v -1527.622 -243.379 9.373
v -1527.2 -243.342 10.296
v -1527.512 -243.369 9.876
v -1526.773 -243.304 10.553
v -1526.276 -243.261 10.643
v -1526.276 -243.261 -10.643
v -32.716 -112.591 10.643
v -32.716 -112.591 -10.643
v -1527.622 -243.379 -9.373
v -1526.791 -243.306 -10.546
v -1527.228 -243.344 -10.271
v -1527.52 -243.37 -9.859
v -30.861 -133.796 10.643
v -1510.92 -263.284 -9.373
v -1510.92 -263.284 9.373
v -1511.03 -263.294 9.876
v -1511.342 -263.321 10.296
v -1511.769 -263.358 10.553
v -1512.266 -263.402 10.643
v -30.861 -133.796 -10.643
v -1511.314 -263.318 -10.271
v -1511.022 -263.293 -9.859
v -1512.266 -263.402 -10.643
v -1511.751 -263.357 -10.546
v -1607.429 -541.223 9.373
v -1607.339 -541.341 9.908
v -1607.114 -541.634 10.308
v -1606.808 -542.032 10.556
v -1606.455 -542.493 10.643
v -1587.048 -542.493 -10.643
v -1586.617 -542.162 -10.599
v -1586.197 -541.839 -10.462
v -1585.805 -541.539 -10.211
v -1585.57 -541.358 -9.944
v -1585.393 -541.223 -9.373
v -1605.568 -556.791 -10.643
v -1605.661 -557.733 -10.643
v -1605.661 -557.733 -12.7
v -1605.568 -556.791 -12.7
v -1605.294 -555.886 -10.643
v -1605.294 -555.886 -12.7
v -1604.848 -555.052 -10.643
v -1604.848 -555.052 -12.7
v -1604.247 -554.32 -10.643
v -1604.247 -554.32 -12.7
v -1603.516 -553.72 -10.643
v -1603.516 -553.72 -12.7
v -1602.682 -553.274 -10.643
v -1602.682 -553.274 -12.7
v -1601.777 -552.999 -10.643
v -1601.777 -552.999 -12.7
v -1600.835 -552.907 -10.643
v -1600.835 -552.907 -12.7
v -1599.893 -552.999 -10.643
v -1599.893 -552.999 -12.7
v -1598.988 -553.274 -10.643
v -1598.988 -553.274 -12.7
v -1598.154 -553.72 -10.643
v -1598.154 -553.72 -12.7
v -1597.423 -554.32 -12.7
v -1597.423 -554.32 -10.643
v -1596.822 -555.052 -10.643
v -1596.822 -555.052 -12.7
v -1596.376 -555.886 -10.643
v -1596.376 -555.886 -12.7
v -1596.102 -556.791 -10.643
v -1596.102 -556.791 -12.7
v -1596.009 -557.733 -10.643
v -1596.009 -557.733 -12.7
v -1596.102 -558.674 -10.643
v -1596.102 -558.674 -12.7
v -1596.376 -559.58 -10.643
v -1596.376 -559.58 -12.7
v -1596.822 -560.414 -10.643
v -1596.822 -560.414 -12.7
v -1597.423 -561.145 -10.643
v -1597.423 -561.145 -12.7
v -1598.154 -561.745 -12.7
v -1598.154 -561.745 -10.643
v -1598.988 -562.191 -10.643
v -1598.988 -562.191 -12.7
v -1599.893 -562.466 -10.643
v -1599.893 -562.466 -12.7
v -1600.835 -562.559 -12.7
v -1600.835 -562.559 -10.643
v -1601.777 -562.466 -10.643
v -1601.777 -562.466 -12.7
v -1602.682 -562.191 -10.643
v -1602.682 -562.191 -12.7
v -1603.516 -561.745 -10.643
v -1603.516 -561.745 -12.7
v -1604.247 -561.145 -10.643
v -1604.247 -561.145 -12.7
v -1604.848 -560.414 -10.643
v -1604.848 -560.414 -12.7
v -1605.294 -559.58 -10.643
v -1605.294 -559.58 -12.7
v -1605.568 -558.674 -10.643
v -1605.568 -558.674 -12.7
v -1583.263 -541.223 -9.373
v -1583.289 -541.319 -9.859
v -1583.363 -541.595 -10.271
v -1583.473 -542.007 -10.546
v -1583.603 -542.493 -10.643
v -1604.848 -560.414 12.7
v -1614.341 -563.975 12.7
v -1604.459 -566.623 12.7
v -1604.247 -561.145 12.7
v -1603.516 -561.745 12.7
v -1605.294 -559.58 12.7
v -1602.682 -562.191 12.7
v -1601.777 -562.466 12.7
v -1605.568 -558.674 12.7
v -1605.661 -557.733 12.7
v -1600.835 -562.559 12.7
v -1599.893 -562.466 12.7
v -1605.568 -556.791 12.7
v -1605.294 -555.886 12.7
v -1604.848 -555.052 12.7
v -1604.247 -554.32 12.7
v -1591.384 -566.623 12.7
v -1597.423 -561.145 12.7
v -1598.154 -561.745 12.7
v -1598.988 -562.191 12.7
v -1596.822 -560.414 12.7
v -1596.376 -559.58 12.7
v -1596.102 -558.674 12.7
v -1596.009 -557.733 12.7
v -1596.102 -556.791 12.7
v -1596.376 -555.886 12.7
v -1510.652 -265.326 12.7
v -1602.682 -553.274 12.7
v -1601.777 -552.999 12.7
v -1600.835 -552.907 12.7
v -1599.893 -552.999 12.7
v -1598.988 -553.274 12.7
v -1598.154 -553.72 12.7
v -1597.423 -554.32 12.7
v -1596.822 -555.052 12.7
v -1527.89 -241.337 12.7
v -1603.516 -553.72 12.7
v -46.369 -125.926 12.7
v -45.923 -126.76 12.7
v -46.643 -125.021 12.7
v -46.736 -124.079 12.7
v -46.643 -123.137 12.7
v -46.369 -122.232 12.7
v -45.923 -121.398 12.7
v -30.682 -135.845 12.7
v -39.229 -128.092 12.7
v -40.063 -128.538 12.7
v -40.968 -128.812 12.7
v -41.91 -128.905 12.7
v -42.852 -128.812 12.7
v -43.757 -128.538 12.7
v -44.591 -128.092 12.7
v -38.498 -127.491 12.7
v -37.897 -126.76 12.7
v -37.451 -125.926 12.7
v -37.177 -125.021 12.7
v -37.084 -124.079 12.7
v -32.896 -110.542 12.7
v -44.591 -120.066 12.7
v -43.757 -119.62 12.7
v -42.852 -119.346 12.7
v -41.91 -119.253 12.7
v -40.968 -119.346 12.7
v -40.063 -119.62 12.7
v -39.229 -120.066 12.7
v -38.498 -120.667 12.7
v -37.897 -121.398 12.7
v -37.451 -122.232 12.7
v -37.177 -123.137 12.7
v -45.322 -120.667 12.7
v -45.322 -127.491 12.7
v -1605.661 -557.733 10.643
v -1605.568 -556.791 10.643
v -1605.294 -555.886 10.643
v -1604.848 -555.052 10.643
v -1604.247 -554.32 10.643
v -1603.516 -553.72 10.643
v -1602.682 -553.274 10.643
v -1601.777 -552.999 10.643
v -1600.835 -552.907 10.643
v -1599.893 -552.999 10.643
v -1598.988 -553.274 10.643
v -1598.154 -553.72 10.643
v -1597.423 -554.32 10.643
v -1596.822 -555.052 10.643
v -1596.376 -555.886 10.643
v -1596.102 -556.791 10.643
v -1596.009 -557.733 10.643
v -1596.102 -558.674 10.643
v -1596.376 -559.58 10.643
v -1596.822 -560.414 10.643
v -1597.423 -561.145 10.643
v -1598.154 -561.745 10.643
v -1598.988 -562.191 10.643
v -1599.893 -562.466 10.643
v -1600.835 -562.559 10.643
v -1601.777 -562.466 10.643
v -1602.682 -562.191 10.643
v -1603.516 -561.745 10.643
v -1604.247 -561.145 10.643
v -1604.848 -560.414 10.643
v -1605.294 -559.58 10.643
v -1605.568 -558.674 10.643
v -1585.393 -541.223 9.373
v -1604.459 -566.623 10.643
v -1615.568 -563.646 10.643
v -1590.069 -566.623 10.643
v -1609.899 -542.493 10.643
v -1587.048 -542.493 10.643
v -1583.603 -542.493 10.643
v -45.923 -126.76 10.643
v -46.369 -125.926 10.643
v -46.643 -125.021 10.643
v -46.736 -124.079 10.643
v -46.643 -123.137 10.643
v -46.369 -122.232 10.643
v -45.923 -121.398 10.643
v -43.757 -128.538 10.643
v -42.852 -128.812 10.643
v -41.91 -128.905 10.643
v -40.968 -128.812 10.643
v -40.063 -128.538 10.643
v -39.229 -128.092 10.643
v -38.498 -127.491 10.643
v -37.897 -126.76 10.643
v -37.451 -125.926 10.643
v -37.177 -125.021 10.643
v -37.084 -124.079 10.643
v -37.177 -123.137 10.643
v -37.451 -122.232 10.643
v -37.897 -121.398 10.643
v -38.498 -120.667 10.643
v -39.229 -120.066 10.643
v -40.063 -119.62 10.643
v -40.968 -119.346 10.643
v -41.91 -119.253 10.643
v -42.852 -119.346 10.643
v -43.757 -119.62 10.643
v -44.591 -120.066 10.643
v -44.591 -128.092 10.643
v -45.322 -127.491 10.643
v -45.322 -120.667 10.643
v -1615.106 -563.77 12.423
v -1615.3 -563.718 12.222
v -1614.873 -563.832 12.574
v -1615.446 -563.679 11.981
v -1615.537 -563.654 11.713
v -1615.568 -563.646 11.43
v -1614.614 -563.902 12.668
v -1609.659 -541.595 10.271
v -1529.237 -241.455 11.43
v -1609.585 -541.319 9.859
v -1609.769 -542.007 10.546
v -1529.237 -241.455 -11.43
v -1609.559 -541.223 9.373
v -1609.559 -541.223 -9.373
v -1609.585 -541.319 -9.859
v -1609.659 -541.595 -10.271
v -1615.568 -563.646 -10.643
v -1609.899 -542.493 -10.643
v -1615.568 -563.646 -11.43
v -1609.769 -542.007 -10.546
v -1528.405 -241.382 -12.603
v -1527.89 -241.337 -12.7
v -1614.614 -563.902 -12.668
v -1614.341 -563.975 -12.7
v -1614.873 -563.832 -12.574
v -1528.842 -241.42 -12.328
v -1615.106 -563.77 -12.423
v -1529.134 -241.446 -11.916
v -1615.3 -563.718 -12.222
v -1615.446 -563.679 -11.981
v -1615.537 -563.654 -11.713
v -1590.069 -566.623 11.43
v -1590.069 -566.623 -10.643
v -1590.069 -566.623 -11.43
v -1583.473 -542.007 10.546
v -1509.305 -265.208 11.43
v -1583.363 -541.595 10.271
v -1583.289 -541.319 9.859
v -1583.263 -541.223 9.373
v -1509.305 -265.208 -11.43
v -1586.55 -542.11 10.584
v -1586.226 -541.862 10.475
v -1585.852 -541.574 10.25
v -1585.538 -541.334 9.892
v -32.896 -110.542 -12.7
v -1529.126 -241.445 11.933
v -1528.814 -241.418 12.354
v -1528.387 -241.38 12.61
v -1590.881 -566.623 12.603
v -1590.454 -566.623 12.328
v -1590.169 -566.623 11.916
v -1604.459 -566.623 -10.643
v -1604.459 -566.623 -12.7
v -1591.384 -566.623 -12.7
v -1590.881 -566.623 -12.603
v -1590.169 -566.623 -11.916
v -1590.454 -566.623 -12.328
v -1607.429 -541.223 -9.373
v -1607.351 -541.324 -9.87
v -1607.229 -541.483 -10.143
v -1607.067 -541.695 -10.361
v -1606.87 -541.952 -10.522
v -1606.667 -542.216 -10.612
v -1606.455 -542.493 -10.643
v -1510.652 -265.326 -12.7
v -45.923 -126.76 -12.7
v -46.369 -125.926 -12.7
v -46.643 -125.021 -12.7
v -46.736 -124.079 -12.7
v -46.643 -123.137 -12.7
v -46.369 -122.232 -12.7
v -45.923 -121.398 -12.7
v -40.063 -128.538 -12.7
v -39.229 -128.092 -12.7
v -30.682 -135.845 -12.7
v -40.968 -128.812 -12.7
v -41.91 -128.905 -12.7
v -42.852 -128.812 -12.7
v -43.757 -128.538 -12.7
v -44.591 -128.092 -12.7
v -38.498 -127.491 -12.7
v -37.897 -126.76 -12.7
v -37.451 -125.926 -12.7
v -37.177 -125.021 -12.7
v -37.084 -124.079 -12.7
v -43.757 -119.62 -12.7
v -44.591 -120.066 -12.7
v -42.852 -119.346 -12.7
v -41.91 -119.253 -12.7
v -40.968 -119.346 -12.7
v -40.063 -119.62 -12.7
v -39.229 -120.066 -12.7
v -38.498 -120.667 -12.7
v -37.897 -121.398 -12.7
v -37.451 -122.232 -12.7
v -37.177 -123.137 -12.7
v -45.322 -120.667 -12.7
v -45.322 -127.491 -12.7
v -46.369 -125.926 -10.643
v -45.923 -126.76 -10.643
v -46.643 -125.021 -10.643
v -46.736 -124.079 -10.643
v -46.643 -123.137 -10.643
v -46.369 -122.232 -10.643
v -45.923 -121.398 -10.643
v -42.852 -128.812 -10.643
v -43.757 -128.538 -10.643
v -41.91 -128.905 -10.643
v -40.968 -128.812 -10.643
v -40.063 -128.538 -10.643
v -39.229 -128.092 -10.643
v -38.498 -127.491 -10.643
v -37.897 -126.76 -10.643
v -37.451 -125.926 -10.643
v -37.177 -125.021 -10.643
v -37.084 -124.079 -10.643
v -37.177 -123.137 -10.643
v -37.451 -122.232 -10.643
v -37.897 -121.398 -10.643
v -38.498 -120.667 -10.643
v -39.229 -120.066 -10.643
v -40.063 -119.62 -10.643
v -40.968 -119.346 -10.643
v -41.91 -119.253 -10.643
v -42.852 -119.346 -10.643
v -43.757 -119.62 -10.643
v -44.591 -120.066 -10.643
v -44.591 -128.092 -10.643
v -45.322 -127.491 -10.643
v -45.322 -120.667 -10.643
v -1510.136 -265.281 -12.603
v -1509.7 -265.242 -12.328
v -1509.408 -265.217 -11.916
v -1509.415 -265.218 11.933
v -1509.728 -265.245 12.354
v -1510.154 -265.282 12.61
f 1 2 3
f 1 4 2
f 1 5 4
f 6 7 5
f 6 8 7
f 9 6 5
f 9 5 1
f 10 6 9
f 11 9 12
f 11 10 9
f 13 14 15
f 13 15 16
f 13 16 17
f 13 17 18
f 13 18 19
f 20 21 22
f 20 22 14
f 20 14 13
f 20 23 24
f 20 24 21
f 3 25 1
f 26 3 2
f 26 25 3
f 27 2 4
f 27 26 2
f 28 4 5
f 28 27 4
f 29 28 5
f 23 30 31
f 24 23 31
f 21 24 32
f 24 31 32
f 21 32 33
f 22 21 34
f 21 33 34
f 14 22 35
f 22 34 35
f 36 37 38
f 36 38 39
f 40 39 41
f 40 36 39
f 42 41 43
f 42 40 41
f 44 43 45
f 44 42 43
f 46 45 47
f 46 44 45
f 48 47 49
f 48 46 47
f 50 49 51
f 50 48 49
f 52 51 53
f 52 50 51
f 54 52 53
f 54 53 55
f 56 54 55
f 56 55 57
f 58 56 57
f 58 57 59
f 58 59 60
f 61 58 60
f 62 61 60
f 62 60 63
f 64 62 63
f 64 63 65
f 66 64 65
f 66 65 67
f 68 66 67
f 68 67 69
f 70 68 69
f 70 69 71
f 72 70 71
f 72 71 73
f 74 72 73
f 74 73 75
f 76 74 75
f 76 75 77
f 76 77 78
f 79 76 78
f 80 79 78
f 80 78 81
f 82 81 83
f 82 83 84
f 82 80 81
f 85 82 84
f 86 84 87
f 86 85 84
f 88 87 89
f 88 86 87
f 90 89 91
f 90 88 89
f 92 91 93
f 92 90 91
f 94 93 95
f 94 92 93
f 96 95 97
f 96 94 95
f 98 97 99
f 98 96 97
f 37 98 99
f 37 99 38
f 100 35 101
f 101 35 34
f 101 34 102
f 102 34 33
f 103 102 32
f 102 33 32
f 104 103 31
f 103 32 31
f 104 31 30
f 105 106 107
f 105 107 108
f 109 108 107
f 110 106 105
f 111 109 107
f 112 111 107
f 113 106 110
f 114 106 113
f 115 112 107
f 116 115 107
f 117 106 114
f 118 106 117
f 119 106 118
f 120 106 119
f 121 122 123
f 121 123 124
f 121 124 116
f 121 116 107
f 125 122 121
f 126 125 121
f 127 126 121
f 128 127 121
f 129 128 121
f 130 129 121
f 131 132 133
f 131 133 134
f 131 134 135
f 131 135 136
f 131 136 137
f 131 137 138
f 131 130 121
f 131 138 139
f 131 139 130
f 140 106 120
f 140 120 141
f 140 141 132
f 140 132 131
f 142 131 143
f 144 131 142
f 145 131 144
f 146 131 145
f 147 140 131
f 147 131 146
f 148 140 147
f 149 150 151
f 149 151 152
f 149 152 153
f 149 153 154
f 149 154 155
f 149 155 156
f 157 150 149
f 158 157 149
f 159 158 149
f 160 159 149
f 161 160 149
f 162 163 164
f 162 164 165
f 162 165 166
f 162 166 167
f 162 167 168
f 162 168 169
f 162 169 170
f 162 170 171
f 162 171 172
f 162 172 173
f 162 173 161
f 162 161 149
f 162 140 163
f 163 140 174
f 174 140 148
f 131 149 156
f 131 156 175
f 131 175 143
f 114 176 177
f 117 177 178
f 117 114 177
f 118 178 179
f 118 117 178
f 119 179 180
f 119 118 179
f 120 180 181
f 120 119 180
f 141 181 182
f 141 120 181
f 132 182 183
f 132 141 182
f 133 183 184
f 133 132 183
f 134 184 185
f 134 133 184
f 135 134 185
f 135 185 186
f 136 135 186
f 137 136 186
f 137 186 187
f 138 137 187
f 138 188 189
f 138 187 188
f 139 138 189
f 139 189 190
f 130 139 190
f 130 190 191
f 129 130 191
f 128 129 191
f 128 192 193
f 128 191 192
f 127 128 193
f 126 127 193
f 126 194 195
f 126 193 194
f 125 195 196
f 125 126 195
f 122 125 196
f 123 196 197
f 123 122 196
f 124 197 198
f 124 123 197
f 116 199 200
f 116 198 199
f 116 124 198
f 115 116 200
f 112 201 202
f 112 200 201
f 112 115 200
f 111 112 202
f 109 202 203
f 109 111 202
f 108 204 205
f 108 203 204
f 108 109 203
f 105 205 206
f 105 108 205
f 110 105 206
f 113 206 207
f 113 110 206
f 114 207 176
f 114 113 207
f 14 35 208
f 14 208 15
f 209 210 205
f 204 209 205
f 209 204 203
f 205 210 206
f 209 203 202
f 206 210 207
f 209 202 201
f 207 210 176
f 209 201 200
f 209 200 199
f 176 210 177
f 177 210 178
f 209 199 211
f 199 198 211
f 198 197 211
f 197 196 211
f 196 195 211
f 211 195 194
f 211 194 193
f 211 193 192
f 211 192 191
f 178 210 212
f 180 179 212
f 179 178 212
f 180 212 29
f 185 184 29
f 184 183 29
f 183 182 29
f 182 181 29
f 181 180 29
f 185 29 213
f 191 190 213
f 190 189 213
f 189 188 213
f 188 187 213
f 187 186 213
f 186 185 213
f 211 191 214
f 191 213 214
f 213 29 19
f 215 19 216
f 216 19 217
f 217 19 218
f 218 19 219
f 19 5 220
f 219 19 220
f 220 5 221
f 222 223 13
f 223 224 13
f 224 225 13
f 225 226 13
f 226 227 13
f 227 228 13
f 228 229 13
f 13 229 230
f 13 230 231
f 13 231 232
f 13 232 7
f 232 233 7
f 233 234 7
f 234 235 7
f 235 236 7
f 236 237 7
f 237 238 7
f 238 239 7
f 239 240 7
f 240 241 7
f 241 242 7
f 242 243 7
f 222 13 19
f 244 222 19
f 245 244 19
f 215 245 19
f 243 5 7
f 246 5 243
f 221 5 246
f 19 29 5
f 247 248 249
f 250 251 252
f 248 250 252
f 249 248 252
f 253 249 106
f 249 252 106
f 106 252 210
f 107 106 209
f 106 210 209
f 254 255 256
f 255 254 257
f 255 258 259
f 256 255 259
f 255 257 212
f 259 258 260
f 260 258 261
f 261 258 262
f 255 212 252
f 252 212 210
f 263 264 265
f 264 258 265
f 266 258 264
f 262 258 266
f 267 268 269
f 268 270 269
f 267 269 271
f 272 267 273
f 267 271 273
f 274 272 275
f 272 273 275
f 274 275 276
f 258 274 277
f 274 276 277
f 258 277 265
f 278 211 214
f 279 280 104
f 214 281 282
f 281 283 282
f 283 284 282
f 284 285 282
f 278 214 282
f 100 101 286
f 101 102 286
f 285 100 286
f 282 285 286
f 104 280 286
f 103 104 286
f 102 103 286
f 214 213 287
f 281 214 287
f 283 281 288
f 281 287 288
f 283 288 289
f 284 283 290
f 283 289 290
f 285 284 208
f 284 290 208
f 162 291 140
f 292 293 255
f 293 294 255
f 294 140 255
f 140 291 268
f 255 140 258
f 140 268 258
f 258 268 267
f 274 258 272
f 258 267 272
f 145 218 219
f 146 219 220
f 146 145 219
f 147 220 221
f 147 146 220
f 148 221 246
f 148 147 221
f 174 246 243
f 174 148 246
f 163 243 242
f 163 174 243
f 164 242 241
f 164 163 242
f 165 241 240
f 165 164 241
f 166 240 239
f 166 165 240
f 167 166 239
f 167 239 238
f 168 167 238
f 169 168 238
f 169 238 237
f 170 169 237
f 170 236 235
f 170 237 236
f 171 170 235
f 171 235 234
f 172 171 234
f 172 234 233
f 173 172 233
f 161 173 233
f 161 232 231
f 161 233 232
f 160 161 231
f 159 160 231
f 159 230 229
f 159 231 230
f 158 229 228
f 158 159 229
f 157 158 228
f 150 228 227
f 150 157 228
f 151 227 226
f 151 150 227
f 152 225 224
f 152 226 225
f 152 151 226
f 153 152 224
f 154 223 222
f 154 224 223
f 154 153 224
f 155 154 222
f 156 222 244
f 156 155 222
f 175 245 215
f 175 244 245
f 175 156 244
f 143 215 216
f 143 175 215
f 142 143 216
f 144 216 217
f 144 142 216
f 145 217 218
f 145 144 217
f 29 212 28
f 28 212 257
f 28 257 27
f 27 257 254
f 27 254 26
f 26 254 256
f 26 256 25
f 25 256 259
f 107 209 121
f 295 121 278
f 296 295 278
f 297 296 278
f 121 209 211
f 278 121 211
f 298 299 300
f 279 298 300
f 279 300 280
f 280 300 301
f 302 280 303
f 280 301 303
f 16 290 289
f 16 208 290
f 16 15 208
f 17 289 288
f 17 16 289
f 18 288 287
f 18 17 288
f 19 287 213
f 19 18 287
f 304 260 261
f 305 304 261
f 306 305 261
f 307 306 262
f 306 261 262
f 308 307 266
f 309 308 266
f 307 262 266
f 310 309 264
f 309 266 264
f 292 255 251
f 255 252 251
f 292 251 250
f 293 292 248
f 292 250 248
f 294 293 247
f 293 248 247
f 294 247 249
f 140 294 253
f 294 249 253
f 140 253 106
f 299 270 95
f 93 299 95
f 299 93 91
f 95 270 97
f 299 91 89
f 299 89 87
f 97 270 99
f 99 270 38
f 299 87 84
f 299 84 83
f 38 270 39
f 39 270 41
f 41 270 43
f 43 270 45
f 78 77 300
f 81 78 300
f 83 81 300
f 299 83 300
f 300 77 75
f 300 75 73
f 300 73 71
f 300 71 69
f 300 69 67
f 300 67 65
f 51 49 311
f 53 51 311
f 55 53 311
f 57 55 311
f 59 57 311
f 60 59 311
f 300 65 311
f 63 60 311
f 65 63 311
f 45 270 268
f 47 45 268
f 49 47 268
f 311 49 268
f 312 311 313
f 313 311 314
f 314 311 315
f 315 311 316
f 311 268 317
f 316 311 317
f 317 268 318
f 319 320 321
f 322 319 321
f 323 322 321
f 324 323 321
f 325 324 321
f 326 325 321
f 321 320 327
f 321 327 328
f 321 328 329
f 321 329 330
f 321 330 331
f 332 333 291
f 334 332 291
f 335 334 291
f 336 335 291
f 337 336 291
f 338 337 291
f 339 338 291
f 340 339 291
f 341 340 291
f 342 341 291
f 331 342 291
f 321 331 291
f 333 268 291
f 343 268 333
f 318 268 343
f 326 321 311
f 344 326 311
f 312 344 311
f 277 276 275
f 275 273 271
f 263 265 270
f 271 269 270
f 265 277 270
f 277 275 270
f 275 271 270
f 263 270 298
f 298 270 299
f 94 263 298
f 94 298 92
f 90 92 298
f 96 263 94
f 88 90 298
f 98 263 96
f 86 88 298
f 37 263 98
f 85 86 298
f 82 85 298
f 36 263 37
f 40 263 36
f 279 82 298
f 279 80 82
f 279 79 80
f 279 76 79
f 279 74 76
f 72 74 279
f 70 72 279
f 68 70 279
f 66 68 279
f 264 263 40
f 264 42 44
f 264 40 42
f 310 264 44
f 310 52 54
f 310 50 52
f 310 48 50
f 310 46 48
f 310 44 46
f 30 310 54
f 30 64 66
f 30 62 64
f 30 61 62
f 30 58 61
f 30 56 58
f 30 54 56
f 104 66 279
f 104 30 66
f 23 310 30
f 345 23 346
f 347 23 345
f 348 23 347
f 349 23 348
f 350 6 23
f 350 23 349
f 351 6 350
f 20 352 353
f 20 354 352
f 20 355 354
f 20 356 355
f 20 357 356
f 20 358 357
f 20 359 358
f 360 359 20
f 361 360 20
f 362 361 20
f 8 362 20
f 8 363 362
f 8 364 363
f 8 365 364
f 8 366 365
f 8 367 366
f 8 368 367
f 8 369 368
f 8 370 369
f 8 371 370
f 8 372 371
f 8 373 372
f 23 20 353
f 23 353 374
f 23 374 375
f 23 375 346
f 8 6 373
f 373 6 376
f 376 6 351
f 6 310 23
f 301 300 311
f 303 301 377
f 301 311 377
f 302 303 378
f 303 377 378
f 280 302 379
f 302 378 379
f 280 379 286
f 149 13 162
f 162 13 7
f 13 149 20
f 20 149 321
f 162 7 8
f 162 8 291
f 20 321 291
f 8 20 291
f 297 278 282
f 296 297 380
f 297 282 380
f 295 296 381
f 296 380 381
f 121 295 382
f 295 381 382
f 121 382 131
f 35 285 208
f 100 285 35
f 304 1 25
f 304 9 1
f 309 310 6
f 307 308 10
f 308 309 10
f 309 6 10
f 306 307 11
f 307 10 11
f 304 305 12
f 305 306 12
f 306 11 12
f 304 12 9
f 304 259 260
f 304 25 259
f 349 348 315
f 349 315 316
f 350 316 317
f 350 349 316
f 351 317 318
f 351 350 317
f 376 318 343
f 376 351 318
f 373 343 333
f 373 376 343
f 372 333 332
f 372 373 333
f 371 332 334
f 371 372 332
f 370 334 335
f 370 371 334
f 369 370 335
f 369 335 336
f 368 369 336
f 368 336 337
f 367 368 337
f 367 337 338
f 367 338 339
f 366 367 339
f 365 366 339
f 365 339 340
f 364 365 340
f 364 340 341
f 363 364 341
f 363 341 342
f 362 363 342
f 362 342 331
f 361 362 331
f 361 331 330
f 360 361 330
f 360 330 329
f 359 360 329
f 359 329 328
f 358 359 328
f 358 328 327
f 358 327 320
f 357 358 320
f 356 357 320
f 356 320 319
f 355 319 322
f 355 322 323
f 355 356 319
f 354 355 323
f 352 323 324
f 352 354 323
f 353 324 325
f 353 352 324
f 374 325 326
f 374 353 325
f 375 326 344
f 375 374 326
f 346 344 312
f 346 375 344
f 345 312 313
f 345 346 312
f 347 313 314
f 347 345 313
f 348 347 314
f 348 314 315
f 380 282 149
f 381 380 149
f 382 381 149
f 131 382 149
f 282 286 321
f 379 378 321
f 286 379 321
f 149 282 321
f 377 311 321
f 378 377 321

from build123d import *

# Parameters (mm, degrees)
SKETCH1_R           = 4.82599999999999
SKETCH1_R_2         = 4.825999999999997
BOSS_EXTRUDE1_DEPTH = 12.7
SHELL1_T            = -2.0574
FILLET1_R           = 1.27
CUT_EXTRUDE1_DEPTH  = 1714.433575902649
SKETCH3_W           = 21.285199999999943
SKETCH3_H           = 25.40000000000009
CUT_EXTRUDE2_DEPTH  = 1713.0984254933278
FILLET2_R           = 1.27


with BuildPart() as part:
    # Sketch1 → Boss-Extrude1 (new, symmetric)
    with BuildSketch(Plane(origin=(0, -98.29799999999999, -2.776e-14), x_dir=(-1, 0, 0), z_dir=(0, 0, -1))):
        Polygon((32.895539800283125, -12.243824987918671), (1529.236557174524, -143.1567007770127), (1615.5675093984726, -465.34820074258795), (1591.0329934107308, -471.92220448819177), (1509.305208165673, -166.9099575635606), (30.681783934492614, -37.54717031944891), align=None)
        with Locations((41.910000000000004, -25.781000000000002)):
            Circle(SKETCH1_R, mode=Mode.SUBTRACT)
        with Locations((1600.835, -459.4347591199864)):
            Circle(SKETCH1_R_2, mode=Mode.SUBTRACT)
    extrude(amount=BOSS_EXTRUDE1_DEPTH, both=True)

    # Shell1
    shell1_openings = [part.faces().sort_by_distance(p)[0] for p in [
        (-31.788661867, -123.193497654, 0),
        (-1603.300251405, -566.933202615, 0),
        (-1596.009, -557.73275912, 0),
        (-37.084, -124.079, 0),
    ]]
    offset(amount=SHELL1_T, openings=shell1_openings, kind=Kind.INTERSECTION)

    # Fillet1
    fillet1_edges = [part.edges().sort_by_distance(p)[0] for p in [
        (-1572.4020332864984, -402.55045075980036, -12.700000000000028),
        (-1551.9699683205642, -416.485826974324, 10.642599999999971),
        (-1570.6011657541362, -403.77870481135244, 10.642599999999971),
        (-1570.6011657541362, -403.77870481135244, -10.642600000000028),
        (-1551.9699683205642, -416.485826974324, -10.642600000000028),
        (-1572.4020332864984, -402.55045075980036, 12.69999999999997),
        (-1550.1691007882018, -417.71408102587617, 12.69999999999997),
        (-1550.1691007882018, -417.71408102587617, -12.700000000000028),
    ]]
    fillet(fillet1_edges, radius=FILLET1_R)

    # Sketch2 → Cut-Extrude1 (cut, through all)
    with BuildSketch(Plane(origin=(0, 0, -12.700000000000028), x_dir=(-1, 0, 0), z_dir=(0, 0, -1))):
        Polygon((1604.4588423023201, -566.6227591199881), (1590.0690608295056, -566.6227591199881), (1591.0329934107308, -570.2202044881918), align=None)
    extrude(amount=-CUT_EXTRUDE1_DEPTH, mode=Mode.SUBTRACT)

    # Sketch3 → Cut-Extrude2 (cut, through all)
    with BuildSketch(Plane(origin=(0, 0, 0), x_dir=(0, 0, -1), z_dir=(1, 0, 0))):
        with Locations((0, -553.9227591199873)):
            Rectangle(SKETCH3_W, SKETCH3_H)
    extrude(amount=-CUT_EXTRUDE2_DEPTH, mode=Mode.SUBTRACT)

    # Fillet2
    fillet2_edges = [part.edges().sort_by_distance(p)[0] for p in [
        (-1607.836777342822, -541.2227591199872, -10.642599999999971),
        (-1584.9855403231031, -541.2227591199872, -10.642599999999971),
        (-1607.836777342822, -541.2227591199872, 10.642599999999971),
        (-1584.9855403231031, -541.2227591199872, 10.642599999999971),
    ]]
    fillet(fillet2_edges, radius=FILLET2_R - 0.0001)  # a hair under: the kernel refuses the full size


solid = part.part
